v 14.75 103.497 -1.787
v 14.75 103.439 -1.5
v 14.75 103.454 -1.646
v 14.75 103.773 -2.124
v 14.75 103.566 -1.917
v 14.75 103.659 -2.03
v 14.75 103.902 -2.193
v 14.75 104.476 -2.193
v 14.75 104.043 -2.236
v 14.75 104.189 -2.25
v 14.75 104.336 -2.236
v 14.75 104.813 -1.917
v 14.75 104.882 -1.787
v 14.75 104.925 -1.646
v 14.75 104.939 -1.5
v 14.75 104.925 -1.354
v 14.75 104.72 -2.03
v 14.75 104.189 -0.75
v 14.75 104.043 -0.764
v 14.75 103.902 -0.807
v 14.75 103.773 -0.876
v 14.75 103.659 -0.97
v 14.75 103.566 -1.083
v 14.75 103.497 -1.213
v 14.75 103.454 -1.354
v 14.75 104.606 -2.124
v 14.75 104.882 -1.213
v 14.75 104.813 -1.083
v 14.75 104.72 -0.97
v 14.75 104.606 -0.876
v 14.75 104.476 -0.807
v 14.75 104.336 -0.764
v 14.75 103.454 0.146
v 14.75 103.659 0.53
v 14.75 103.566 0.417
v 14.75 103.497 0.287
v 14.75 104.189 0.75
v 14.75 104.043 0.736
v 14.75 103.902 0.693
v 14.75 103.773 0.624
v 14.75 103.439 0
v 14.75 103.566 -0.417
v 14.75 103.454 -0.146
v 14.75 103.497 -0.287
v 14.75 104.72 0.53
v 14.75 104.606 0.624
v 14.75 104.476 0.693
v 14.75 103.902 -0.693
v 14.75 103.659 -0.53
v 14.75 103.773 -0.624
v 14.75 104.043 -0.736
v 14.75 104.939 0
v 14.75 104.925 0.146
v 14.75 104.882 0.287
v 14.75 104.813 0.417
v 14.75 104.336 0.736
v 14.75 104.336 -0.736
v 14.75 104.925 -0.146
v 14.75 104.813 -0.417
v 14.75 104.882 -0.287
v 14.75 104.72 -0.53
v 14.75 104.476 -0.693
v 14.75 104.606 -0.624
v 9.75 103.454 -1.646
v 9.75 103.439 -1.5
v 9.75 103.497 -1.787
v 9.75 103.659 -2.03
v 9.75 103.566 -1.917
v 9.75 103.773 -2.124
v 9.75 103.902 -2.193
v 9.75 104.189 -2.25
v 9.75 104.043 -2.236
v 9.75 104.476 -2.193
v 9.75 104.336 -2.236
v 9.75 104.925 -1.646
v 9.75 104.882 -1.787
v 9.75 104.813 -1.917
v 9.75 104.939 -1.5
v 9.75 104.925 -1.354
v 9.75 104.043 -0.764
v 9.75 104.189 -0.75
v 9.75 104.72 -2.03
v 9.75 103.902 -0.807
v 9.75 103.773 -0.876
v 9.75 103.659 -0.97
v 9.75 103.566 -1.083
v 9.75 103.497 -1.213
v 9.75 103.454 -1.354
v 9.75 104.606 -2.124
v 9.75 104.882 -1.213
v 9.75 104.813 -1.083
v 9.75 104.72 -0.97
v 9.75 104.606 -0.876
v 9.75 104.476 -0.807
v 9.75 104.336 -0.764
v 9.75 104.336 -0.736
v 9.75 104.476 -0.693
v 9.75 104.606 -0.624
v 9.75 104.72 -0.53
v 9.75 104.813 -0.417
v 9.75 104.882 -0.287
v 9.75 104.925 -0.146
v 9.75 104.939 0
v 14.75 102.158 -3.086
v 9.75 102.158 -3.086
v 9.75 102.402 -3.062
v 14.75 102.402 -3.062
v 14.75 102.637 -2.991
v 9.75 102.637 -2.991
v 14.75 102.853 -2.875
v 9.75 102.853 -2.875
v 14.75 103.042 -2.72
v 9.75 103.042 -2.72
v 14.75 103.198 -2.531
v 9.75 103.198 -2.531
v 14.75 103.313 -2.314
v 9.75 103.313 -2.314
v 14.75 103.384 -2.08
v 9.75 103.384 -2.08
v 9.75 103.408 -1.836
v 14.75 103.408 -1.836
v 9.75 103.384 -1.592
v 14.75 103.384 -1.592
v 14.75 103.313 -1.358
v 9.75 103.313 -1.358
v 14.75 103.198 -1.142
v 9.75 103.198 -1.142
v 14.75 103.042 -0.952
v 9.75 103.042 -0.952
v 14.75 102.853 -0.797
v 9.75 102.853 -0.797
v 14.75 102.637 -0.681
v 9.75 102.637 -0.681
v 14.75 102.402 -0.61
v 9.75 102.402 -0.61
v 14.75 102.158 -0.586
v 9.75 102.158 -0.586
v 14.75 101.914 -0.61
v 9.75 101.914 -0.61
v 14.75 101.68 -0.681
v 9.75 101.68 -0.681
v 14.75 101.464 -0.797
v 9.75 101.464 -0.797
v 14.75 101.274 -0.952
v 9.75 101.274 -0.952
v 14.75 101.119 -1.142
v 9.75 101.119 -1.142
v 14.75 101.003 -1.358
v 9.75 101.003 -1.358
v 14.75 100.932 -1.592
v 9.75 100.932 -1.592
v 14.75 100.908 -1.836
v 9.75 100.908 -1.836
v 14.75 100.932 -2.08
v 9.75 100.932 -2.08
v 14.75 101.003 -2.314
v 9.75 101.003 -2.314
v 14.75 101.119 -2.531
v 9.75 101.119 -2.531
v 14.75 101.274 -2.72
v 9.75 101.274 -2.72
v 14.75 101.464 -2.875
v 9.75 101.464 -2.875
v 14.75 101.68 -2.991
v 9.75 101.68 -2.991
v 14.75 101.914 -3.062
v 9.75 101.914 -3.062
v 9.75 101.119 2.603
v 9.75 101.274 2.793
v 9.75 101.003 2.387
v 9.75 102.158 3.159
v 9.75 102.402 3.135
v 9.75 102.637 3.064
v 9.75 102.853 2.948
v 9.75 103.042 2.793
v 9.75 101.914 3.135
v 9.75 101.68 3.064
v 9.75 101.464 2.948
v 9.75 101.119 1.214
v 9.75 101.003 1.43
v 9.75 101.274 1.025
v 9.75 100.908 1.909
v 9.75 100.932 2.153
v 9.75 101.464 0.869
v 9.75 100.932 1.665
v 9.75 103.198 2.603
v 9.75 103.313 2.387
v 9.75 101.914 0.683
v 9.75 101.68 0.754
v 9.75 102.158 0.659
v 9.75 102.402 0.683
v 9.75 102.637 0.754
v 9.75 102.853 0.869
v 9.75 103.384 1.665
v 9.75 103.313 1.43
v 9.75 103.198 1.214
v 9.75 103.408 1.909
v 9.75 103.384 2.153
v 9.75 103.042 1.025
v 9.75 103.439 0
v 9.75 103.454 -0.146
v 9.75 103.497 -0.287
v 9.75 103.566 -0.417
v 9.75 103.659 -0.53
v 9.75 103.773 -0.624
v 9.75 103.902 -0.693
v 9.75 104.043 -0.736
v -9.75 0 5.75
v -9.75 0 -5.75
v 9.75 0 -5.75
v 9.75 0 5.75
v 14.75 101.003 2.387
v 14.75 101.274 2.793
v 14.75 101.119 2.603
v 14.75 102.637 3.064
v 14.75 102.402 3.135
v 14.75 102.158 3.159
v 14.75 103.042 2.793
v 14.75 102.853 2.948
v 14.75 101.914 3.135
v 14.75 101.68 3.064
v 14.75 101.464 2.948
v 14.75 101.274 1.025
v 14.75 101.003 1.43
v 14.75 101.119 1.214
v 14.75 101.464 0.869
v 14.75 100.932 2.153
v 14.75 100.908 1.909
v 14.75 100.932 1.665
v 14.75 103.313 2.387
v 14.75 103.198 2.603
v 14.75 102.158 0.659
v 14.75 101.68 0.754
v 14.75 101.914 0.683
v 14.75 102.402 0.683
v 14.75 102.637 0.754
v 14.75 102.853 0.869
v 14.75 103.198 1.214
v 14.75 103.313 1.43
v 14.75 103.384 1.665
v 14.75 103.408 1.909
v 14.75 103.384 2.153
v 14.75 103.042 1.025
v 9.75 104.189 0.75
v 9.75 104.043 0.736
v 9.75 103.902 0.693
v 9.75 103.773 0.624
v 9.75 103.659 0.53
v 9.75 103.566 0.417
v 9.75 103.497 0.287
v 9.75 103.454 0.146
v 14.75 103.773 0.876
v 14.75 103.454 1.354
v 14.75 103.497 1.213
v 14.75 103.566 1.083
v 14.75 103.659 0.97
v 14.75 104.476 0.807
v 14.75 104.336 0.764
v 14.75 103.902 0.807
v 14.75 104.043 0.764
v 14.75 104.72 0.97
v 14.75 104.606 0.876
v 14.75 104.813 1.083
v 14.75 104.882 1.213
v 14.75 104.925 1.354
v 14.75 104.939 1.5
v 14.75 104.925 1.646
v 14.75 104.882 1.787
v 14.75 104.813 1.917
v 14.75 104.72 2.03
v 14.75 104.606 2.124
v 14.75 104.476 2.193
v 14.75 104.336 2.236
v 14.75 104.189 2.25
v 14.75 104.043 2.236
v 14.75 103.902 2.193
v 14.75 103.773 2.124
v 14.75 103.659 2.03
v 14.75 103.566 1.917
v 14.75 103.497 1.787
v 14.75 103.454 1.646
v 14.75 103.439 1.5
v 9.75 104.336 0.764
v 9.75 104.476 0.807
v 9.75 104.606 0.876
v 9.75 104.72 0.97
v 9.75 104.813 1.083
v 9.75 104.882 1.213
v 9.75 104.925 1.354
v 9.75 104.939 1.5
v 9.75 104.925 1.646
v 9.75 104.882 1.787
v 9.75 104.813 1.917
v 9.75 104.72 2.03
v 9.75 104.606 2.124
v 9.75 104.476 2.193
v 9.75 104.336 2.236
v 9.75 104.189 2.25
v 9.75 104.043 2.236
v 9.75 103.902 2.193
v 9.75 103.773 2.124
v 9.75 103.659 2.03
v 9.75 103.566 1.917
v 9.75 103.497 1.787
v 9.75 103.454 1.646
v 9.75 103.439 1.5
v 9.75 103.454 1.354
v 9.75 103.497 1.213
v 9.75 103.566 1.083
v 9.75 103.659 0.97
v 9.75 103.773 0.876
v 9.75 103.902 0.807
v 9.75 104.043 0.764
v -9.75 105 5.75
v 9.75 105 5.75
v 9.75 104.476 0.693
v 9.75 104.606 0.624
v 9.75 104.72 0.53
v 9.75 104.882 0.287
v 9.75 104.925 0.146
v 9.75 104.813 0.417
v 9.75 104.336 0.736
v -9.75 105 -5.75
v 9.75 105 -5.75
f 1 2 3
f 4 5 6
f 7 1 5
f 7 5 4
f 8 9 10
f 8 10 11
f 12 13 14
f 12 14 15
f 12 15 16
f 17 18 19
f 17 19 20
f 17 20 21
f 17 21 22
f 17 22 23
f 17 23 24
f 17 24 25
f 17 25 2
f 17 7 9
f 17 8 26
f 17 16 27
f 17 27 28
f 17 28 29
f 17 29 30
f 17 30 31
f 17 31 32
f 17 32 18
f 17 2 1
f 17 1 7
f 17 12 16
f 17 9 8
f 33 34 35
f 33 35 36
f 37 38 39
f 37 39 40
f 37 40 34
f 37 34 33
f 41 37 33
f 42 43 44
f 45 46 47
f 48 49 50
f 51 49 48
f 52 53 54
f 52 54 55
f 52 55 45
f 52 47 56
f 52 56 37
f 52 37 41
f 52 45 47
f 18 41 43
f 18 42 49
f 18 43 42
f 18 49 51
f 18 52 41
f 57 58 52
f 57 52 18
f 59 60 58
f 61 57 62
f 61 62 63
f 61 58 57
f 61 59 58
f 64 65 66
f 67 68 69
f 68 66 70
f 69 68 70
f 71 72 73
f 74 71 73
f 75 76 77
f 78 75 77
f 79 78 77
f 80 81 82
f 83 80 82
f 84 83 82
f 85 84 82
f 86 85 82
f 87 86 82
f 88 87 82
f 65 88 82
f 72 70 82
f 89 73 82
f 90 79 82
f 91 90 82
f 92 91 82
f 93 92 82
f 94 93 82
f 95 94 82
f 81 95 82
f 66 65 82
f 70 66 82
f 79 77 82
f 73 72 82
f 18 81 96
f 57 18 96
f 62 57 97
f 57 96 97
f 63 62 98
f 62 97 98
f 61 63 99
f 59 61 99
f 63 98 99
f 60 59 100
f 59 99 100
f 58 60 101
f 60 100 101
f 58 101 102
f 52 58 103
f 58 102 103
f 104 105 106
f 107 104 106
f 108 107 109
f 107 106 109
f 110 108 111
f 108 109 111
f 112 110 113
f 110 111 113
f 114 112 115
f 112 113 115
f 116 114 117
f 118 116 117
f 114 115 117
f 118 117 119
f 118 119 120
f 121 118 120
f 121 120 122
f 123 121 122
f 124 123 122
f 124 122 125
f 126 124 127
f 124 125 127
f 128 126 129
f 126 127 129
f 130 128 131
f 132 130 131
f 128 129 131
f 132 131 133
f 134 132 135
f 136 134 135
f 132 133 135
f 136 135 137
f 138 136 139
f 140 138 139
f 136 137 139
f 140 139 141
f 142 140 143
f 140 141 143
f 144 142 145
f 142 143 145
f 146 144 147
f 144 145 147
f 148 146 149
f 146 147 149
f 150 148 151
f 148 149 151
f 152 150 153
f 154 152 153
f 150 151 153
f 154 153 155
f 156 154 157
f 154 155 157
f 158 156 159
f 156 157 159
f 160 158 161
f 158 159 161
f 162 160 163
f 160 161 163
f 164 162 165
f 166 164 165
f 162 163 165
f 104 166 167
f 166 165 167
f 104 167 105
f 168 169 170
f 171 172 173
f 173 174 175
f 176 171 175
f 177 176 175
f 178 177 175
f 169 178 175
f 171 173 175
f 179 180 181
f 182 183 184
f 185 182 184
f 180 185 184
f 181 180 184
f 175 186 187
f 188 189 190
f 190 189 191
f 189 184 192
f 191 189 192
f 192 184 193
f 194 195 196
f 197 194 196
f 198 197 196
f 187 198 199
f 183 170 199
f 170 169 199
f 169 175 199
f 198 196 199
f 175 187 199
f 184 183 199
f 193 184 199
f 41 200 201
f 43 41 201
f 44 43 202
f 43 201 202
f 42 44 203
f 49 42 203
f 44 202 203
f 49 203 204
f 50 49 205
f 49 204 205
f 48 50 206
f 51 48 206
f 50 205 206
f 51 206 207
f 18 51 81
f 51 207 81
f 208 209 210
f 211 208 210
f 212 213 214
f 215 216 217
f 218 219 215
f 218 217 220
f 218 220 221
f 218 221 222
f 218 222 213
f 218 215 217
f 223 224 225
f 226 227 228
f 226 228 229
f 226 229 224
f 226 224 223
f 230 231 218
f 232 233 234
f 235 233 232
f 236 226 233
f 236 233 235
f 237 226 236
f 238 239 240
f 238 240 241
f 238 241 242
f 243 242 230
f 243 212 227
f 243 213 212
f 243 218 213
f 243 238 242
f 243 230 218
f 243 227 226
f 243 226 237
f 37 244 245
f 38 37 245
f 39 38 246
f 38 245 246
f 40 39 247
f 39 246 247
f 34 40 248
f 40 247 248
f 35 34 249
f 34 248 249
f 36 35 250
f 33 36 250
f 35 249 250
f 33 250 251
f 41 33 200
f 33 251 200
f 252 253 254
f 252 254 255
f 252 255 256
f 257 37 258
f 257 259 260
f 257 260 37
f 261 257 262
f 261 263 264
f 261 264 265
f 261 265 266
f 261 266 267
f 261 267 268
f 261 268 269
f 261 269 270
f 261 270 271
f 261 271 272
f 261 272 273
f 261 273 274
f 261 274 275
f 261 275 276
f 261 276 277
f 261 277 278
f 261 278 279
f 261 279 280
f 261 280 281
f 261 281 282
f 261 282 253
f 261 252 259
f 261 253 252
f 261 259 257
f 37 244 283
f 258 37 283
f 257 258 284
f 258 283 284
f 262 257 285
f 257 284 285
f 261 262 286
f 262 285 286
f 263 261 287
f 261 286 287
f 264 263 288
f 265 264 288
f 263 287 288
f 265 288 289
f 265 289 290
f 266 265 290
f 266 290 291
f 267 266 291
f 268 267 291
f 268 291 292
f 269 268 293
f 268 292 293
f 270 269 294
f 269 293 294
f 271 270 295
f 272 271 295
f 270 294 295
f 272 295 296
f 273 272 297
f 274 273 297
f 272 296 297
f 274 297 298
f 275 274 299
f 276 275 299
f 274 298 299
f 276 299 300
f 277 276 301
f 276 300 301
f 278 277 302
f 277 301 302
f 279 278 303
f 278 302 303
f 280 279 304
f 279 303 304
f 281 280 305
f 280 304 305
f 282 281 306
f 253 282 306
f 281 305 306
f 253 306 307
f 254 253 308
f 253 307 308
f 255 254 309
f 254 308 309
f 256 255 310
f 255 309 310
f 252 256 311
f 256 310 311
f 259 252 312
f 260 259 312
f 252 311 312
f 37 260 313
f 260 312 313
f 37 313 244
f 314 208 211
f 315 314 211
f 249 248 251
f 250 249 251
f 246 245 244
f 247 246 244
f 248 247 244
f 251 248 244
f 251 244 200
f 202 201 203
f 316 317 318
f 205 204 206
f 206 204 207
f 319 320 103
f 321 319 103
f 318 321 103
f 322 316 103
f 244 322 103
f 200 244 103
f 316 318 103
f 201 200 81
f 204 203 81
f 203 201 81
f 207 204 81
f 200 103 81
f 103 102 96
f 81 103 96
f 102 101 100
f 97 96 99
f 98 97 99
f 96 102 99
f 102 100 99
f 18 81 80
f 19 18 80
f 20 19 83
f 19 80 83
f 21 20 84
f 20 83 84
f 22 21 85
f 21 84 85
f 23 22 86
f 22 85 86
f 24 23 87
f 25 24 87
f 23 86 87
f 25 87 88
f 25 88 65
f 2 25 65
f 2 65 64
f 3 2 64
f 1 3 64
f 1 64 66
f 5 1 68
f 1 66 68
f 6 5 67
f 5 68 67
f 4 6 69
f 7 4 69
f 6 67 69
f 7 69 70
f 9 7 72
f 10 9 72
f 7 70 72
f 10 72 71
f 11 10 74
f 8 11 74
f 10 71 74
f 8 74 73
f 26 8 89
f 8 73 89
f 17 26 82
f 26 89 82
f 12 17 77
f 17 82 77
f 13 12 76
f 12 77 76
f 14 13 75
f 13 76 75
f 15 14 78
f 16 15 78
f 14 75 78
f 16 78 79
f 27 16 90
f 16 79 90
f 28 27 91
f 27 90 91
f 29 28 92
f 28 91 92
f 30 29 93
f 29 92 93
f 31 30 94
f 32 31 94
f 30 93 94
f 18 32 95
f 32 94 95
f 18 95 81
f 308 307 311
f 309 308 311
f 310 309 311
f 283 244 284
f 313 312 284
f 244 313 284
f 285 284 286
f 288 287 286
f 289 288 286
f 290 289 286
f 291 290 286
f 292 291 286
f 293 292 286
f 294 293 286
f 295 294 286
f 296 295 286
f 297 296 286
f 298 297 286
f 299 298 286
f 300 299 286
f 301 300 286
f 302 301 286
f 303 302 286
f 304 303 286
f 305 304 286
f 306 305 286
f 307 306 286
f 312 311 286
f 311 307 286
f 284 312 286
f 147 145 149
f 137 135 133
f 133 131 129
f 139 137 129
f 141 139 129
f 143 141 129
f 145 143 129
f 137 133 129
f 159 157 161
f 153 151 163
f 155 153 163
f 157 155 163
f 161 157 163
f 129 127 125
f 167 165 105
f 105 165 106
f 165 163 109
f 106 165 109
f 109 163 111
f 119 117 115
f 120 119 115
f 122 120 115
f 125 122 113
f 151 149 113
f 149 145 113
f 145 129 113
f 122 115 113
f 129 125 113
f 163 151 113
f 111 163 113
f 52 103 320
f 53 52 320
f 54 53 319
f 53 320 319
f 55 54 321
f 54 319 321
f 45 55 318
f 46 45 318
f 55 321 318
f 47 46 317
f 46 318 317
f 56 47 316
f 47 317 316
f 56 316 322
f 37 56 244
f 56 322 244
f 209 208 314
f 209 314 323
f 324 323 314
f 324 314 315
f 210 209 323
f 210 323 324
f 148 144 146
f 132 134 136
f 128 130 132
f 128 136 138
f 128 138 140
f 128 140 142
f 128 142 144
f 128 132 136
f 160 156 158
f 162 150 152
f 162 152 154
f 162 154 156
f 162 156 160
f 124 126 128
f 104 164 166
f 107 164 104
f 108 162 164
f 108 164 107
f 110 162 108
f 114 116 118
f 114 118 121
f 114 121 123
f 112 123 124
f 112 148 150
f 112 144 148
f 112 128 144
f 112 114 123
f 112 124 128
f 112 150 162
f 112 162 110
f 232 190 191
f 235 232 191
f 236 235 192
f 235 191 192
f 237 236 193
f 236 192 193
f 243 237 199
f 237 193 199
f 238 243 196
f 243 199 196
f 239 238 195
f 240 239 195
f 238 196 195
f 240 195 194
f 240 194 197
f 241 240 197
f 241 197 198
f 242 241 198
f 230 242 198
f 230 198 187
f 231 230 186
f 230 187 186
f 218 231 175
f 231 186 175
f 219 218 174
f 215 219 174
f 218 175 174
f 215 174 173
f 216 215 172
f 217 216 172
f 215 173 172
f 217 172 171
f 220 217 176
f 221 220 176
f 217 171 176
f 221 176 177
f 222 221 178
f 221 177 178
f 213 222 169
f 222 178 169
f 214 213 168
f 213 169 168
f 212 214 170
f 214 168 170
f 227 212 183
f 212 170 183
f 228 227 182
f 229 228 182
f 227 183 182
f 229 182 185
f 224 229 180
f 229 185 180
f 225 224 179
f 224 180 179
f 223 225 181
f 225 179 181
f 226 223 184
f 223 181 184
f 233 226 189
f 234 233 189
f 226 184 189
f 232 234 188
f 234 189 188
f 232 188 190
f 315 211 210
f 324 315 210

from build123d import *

# Parameters (mm, degrees)
SKETCH1_W           = 19.5
SKETCH1_H           = 11.5
BOSS_EXTRUDE1_DEPTH = 105
SKETCH2_R           = 0.75
SKETCH2_R_2         = 1.25
BOSS_EXTRUDE3_DEPTH = 5


with BuildPart() as part:
    # Sketch1 → Boss-Extrude1 (new body)
    with BuildSketch(Plane(origin=(0, 0, 0), x_dir=(1, 0, 0), z_dir=(0, 1, 0))):
        Rectangle(SKETCH1_W, SKETCH1_H)
    extrude(amount=BOSS_EXTRUDE1_DEPTH)


with BuildPart() as body_2:
    # Sketch2 → Boss-Extrude3 (new body)
    with BuildSketch(Plane(origin=(9.75, 0, 0), x_dir=(0, 0, -1), z_dir=(1, 0, 0))):
        with Locations((-1.5, 104.189461368)):
            Circle(SKETCH2_R)
        with Locations((-1.908718428, 102.158194126)):
            Circle(SKETCH2_R_2)
        with BuildLine():
            ThreePointArc((0.75, 104.189461368), (0.530330086, 104.719791454), (0, 104.939461368))
            Line((0, 104.939461368), (0, 103.439461368))
            ThreePointArc((0, 103.439461368), (0.530330086, 103.659131282), (0.75, 104.189461368))
        make_face()
        with BuildLine():
            Line((0, 103.439461368), (0, 104.939461368))
            ThreePointArc((0, 104.939461368), (-0.530330086, 104.719791454), (-0.75, 104.189461368))
            ThreePointArc((-0.75, 104.189461368), (-0.530330086, 103.659131282), (0, 103.439461368))
        make_face()
        with Locations((1.5, 104.189461368)):
            Circle(SKETCH2_R)
        with Locations((1.836128902, 102.158194126)):
            Circle(SKETCH2_R_2)
    extrude(amount=BOSS_EXTRUDE3_DEPTH)


solid = Compound([part.part, body_2.part])
